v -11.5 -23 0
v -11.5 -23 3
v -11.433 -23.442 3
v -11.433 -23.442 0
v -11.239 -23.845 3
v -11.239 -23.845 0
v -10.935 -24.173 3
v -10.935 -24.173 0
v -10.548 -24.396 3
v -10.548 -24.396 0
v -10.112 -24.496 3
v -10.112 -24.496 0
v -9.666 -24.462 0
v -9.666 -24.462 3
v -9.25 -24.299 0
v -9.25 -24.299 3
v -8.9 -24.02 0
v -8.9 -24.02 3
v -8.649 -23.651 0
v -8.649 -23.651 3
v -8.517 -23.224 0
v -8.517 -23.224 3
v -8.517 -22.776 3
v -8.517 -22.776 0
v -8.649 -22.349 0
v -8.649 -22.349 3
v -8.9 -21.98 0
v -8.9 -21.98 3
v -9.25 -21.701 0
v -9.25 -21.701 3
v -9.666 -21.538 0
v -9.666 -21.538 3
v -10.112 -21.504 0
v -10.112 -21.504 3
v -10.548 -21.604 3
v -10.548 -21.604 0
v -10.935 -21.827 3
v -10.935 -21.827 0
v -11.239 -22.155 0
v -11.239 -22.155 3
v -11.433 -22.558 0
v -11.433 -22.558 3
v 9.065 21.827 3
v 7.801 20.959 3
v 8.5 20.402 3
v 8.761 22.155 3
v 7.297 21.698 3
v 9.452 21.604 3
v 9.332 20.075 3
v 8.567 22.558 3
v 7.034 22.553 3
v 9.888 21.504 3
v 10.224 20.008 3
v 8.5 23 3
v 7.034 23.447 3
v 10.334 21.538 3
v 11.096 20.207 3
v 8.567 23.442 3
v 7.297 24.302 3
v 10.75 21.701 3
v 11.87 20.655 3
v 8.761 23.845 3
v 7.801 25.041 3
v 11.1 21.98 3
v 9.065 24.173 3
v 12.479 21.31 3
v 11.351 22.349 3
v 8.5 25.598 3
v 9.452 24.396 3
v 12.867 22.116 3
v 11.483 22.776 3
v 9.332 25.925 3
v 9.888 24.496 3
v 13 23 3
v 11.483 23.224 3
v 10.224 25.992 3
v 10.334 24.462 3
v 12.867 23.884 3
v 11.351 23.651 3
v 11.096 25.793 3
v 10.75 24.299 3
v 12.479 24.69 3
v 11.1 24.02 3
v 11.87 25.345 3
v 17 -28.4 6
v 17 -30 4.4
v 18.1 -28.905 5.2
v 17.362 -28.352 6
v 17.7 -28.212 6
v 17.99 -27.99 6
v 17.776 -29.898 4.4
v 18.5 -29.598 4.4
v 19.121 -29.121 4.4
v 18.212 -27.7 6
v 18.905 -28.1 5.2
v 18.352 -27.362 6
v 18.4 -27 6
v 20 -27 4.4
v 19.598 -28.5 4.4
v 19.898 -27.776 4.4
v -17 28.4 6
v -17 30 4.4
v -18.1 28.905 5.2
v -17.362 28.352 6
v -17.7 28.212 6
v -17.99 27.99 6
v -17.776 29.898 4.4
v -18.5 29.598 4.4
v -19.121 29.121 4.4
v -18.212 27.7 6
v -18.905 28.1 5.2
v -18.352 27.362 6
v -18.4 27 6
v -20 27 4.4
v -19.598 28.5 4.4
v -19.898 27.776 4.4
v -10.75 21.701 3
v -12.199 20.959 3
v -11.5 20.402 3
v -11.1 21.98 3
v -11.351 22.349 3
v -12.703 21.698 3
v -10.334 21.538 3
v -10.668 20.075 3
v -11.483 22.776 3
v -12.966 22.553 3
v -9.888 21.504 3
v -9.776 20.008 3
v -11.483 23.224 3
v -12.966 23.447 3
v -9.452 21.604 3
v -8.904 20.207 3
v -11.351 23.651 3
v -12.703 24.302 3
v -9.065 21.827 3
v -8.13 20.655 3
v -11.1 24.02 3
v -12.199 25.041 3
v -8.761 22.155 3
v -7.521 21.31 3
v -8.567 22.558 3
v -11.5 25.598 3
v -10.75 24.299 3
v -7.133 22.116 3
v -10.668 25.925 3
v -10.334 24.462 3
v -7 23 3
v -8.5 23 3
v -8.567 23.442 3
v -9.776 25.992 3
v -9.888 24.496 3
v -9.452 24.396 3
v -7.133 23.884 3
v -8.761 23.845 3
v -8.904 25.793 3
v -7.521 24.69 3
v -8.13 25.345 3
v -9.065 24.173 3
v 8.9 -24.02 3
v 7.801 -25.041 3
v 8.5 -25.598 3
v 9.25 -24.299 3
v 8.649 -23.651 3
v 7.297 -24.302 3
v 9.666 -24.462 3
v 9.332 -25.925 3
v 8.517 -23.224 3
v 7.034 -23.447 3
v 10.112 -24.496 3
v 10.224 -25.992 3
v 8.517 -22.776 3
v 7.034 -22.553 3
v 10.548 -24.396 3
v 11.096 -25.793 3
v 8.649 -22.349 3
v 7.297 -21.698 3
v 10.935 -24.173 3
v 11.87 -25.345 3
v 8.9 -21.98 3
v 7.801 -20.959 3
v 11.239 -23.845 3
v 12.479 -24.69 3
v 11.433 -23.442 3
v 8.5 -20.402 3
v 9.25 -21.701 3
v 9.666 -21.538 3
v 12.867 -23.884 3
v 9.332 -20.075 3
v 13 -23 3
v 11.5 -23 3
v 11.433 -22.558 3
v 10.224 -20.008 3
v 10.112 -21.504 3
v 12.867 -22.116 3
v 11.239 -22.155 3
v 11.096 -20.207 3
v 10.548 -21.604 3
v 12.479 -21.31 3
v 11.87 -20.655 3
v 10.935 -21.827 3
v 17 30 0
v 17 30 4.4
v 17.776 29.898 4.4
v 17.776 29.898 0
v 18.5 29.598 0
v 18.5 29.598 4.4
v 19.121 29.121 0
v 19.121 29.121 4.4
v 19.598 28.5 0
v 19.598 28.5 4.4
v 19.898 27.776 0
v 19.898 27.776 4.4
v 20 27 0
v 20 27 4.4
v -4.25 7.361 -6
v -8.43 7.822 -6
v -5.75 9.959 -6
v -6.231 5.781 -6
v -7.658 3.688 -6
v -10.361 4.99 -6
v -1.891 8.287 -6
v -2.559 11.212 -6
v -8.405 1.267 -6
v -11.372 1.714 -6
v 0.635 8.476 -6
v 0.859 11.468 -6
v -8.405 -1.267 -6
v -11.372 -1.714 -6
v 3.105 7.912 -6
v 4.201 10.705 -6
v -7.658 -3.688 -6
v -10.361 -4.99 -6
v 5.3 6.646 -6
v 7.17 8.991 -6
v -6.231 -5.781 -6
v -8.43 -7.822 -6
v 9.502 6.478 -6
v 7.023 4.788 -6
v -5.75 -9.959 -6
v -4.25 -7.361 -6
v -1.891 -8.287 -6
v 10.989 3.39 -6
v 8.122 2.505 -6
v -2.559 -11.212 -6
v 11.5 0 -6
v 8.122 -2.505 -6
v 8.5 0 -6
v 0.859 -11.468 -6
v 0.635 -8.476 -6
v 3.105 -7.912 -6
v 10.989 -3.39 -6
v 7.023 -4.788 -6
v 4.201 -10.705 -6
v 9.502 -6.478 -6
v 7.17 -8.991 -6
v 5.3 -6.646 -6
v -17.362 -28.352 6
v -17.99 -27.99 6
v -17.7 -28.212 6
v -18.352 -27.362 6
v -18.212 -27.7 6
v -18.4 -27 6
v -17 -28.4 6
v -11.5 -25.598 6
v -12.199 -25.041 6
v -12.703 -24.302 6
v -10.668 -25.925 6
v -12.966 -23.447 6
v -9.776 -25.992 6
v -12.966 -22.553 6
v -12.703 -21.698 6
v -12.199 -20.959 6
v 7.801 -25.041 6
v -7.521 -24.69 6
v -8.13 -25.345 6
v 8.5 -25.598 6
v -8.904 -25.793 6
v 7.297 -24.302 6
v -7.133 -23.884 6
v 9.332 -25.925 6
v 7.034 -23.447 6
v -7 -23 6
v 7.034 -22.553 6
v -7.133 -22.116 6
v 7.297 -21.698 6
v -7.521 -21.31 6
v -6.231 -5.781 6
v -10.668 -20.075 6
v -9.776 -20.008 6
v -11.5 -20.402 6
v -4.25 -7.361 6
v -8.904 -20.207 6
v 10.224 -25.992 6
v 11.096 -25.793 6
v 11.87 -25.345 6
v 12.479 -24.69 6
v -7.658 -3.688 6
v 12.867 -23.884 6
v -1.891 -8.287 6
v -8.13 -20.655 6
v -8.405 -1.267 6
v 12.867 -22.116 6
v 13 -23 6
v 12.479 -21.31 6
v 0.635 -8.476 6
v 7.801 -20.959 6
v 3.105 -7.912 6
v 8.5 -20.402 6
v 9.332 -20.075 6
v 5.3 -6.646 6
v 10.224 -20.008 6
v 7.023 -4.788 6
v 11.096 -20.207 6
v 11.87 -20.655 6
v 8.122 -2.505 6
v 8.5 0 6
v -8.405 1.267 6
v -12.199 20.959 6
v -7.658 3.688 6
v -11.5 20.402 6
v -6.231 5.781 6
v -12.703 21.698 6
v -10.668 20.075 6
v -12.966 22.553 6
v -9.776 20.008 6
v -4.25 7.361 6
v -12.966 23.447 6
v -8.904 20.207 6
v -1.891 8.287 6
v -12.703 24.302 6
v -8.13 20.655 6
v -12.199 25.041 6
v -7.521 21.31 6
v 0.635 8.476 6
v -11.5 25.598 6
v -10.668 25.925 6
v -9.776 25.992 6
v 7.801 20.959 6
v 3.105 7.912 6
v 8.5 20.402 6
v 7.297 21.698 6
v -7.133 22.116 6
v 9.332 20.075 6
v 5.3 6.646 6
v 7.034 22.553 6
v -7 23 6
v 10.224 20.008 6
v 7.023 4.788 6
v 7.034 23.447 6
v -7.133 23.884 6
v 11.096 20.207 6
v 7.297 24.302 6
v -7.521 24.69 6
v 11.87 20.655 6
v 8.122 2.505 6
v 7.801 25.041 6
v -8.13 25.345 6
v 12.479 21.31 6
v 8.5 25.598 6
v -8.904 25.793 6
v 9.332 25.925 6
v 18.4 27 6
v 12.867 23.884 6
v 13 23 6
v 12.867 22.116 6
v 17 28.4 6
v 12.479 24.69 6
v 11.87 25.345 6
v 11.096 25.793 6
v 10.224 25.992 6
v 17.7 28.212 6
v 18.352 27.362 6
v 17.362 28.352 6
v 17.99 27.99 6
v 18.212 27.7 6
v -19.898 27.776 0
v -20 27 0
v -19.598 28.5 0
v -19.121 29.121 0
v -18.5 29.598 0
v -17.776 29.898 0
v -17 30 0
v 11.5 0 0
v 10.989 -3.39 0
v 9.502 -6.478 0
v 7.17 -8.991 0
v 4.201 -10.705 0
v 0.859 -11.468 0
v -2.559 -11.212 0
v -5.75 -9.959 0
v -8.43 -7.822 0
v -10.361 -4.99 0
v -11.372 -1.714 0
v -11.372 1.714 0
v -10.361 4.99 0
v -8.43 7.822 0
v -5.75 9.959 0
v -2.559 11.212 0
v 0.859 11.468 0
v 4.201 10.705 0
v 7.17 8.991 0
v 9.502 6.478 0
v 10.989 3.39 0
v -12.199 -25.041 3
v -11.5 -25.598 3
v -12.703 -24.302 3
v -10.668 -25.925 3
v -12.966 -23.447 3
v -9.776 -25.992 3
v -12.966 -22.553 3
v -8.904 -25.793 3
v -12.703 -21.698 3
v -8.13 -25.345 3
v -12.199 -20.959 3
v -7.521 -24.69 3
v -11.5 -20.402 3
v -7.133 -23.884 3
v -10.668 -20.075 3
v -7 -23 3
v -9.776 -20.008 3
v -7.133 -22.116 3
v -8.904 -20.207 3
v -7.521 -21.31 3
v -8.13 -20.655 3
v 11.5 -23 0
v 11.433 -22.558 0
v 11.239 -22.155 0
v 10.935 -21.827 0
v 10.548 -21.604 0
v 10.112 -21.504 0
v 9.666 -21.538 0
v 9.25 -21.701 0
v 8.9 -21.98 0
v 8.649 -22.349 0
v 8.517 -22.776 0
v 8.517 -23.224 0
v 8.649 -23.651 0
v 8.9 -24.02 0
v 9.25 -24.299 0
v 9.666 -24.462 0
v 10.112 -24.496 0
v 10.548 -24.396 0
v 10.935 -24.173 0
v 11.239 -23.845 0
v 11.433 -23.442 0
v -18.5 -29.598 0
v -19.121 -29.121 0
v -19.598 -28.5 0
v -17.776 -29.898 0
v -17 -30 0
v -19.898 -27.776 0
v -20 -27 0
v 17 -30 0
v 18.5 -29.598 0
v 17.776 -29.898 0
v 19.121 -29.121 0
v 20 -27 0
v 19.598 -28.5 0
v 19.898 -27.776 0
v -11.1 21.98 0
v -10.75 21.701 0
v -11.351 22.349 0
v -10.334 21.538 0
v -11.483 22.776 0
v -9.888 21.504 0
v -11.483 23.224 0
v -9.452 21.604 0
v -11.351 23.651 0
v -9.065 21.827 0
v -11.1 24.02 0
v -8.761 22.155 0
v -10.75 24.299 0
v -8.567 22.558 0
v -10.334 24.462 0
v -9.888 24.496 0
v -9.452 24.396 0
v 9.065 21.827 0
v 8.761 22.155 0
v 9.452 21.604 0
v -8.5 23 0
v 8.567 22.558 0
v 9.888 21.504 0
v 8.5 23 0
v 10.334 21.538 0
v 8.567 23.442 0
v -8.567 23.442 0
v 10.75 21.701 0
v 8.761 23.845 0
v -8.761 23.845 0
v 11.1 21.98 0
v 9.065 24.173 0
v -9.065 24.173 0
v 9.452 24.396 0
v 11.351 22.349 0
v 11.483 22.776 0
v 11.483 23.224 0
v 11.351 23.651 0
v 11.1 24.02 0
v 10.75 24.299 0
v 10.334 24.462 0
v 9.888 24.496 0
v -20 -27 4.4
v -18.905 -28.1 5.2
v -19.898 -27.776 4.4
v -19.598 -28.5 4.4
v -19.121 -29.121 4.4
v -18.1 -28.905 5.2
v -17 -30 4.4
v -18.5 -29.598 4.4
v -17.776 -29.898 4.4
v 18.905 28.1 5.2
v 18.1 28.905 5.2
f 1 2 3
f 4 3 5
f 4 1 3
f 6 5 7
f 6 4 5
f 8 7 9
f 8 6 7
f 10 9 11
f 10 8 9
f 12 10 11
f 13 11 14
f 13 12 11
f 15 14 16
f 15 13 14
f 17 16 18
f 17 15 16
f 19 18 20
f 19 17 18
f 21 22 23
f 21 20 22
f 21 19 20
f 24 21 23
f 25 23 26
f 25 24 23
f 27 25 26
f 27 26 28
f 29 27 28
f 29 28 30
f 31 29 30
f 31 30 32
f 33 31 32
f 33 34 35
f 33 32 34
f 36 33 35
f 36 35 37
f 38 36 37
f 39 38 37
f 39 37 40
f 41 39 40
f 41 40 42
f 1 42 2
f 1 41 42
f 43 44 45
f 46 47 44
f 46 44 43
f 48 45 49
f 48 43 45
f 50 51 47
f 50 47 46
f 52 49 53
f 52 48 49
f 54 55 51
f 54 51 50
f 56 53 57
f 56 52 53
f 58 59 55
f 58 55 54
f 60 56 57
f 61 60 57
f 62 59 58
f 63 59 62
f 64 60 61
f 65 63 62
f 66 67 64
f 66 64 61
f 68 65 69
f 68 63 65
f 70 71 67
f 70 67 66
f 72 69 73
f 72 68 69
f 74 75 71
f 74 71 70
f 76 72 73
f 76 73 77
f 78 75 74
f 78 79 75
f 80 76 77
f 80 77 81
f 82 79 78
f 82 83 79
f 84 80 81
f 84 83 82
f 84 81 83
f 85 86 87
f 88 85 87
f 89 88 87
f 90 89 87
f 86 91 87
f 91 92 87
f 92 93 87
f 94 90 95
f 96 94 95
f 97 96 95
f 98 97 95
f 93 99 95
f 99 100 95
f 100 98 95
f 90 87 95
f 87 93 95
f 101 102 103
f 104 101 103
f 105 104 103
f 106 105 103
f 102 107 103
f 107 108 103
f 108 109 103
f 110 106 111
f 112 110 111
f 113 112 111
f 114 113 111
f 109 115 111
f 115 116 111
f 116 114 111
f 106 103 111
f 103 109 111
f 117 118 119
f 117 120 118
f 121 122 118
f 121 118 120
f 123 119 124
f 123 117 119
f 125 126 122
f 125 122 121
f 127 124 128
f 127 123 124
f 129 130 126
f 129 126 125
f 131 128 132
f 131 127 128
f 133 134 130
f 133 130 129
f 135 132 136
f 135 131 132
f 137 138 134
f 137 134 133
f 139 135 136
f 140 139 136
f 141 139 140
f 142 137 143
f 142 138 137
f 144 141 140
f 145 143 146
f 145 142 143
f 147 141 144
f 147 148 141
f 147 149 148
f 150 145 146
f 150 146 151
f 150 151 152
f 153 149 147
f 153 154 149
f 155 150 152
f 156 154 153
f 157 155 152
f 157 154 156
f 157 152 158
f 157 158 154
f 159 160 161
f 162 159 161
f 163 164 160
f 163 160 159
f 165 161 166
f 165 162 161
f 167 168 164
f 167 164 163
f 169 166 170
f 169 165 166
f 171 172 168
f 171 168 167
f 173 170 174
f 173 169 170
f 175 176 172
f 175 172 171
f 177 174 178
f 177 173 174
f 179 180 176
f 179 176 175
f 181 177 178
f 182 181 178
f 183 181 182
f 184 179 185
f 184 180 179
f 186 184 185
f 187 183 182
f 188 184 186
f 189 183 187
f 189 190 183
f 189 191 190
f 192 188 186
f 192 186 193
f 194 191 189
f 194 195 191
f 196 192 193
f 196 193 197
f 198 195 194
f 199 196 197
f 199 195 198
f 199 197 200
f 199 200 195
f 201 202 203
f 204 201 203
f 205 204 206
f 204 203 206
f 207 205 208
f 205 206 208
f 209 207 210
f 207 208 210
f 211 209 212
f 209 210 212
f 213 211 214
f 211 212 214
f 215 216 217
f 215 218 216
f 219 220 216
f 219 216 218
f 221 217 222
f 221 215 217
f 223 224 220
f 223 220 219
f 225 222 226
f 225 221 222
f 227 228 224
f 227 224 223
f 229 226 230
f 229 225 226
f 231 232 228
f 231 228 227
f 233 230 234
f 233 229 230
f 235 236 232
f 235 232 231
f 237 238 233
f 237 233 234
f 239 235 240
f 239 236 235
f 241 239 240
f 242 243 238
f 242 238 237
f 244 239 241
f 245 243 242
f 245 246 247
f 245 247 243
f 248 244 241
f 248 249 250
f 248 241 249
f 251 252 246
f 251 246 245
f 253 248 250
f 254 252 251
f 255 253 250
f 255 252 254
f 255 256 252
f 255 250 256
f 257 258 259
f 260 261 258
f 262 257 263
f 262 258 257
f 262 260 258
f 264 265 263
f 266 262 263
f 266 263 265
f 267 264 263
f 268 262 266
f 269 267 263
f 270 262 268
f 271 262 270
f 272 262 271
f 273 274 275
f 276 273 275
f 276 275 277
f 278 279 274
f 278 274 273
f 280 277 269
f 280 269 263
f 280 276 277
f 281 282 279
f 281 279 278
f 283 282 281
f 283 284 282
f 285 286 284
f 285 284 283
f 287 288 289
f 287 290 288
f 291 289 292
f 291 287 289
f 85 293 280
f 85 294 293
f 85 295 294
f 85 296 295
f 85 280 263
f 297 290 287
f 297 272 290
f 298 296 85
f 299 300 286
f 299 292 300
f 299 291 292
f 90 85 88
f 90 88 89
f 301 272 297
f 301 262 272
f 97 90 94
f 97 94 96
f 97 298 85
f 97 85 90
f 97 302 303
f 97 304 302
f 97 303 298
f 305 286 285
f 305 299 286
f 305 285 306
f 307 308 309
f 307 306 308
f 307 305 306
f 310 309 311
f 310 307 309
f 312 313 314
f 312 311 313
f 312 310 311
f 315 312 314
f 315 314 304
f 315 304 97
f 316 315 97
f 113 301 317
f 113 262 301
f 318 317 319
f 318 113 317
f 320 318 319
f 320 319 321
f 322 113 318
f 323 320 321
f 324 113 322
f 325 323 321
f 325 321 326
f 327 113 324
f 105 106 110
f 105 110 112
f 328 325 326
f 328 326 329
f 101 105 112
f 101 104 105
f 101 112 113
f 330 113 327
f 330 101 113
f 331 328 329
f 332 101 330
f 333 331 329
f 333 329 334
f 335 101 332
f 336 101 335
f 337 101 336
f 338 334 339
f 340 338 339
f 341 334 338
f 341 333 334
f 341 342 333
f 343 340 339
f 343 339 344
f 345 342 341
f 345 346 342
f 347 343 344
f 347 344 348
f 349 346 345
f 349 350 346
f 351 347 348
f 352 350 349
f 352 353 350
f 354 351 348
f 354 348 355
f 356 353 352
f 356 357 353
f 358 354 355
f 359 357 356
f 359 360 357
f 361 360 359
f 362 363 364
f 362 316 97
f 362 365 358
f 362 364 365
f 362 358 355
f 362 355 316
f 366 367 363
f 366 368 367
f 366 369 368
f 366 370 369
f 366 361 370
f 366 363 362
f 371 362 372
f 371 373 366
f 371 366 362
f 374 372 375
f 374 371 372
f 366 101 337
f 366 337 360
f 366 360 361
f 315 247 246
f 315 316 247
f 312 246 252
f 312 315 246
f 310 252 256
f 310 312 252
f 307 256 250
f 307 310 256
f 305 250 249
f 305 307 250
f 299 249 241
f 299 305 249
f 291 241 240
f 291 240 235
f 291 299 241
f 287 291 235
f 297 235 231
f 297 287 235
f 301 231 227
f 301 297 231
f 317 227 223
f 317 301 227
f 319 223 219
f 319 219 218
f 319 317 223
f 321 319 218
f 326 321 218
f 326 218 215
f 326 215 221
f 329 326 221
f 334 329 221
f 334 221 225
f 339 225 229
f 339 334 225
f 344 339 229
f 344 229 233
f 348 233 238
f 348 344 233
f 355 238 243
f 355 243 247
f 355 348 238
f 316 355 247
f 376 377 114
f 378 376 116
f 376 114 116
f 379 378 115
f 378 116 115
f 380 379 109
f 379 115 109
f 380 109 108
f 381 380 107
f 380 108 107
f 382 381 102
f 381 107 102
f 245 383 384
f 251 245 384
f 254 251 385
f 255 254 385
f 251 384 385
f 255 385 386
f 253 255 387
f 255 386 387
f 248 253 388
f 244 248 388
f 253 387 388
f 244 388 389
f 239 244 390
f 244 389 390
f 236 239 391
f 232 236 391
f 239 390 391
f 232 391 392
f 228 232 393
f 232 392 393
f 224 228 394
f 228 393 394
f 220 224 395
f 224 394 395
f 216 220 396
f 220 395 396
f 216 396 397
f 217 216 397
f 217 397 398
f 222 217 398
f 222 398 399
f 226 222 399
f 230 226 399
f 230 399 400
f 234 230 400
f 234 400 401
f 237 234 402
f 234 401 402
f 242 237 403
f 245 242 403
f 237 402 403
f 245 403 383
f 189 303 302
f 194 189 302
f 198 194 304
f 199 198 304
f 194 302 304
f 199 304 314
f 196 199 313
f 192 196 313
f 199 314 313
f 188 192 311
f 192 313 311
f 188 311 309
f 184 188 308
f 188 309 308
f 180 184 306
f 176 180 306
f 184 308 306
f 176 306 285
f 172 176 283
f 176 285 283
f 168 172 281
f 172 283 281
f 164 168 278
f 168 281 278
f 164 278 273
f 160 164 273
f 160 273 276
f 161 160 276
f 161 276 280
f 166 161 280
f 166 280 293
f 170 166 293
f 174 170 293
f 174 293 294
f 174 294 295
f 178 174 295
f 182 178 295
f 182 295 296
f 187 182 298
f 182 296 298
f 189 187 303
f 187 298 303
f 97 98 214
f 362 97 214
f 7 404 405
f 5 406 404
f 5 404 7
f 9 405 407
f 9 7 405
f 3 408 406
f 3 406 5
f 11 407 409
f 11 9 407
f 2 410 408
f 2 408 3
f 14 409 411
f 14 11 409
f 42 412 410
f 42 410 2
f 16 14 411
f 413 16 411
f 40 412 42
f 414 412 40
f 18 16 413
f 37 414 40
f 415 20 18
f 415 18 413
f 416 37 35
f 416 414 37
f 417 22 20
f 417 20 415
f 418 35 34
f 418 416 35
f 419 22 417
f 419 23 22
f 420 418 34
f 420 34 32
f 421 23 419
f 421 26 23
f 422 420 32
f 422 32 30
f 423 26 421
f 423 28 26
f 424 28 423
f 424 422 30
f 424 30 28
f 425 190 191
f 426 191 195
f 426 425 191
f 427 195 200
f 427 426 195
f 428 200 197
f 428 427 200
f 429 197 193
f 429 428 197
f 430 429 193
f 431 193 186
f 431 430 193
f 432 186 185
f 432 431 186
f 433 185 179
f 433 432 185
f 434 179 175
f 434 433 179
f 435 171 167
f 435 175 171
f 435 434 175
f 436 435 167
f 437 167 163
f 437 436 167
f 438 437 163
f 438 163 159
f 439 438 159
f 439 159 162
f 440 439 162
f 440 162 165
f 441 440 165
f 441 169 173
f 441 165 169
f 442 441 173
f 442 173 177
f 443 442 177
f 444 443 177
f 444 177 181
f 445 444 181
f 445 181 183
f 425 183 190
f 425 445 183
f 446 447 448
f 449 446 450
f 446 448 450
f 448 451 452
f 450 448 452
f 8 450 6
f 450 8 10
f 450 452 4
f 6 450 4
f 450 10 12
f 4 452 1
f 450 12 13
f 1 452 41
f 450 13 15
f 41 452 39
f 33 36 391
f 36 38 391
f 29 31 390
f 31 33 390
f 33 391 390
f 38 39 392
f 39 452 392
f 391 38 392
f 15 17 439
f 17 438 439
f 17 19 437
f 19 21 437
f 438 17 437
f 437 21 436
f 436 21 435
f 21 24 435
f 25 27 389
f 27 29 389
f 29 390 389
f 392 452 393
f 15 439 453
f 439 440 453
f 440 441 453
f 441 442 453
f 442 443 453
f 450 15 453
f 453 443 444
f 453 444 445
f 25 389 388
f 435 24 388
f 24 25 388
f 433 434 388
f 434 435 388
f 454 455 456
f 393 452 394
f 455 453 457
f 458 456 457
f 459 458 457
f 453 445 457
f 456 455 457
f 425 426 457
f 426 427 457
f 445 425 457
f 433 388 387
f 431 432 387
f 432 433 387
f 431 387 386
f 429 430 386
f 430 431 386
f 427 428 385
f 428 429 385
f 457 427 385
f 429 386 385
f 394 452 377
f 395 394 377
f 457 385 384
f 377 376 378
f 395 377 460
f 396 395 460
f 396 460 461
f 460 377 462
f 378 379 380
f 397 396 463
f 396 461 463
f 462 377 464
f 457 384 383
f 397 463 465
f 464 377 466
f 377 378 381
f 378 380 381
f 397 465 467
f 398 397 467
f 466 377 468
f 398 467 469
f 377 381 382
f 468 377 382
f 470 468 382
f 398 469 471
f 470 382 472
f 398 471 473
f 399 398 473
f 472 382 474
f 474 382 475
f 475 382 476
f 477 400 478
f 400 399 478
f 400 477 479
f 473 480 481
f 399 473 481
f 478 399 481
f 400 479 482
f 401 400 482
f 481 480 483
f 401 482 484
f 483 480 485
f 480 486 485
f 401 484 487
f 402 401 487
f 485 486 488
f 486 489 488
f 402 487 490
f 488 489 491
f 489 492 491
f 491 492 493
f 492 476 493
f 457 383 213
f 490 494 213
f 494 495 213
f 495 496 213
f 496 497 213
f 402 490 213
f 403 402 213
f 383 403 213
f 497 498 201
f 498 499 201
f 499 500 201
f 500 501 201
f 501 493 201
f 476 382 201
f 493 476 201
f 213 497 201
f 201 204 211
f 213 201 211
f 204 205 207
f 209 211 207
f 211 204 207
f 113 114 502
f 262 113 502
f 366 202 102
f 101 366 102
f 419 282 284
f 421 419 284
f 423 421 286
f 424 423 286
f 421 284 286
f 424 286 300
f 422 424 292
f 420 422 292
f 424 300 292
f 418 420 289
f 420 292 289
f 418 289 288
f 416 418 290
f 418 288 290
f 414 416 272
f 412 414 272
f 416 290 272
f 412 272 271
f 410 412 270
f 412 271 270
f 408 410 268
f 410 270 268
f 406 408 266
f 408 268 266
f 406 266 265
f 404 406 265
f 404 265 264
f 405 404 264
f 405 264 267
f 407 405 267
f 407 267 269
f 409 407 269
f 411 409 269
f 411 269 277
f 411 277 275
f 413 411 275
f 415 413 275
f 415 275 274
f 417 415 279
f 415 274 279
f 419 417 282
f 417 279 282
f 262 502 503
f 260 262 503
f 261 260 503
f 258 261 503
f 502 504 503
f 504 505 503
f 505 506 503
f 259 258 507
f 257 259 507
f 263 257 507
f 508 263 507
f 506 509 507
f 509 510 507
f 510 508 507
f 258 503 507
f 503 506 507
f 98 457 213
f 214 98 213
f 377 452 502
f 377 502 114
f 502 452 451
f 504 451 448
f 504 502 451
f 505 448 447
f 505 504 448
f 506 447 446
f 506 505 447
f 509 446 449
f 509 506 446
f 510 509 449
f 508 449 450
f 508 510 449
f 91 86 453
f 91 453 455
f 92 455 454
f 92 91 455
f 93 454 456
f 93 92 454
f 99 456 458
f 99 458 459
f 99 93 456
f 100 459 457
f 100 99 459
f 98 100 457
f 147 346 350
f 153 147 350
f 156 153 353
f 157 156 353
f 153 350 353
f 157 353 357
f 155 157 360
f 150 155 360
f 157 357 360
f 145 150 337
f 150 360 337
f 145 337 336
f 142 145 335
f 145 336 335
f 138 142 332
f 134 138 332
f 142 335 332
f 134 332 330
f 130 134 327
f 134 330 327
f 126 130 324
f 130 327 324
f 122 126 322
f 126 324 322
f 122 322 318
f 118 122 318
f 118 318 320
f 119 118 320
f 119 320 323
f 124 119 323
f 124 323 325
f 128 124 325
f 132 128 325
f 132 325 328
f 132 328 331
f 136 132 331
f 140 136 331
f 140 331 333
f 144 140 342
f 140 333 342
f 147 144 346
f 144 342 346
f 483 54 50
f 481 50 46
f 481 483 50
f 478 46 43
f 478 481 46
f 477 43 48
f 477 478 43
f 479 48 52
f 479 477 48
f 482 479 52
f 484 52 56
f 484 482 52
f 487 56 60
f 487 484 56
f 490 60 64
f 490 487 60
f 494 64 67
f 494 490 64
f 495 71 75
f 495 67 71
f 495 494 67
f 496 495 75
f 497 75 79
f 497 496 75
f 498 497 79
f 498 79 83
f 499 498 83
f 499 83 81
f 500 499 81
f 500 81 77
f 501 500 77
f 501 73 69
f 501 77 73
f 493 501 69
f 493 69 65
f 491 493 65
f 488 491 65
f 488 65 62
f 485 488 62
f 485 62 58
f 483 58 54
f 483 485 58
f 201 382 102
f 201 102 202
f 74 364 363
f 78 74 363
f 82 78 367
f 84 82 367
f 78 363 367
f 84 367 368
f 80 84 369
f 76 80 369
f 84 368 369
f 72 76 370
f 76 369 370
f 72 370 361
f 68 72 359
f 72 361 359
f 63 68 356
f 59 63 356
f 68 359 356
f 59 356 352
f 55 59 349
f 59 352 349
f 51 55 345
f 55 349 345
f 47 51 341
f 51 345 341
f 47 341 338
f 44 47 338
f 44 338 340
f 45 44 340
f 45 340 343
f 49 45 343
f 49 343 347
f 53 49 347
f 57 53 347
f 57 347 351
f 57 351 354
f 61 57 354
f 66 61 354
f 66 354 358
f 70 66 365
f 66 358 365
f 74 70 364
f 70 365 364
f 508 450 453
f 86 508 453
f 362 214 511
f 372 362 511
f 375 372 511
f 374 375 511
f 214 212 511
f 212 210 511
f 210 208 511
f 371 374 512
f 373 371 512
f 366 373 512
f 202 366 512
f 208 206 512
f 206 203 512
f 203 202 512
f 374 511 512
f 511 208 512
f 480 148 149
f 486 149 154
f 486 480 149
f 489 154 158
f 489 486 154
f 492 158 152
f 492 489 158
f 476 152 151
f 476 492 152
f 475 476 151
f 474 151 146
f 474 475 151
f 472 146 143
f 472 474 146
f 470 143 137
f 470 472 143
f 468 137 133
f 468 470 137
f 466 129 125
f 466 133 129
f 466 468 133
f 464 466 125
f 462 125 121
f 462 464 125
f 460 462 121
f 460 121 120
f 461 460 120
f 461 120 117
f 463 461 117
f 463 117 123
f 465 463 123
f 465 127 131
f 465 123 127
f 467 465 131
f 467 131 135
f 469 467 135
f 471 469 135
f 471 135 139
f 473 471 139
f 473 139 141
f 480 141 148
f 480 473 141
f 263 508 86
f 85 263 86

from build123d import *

# Parameters (mm, degrees)
SKETCH_1_W          = 40
SKETCH_1_H          = 60
SKETCH_1_R          = 1.5
EXTRUDE_1_DEPTH     = 6
SKETCH_2_R          = 3
CUT_EXTRUDE_1_DEPTH = 3
FILLET_1_R          = 3
CHAMFER_1_SIZE      = 1.6
SKETCH_3_R          = 8.5
CUT_EXTRUDE_2_DEPTH = 37.551333765
SKETCH_4_R          = 11.5
SKETCH_4_R_2        = 8.5
EXTRUDE_2_DEPTH     = 6


with BuildPart() as part:
    # 草圖1 → 填料-伸長1 (new body)
    with BuildSketch(Plane.XY):
        Rectangle(SKETCH_1_W, SKETCH_1_H)
        with Locations((-10, 23)):
            Circle(SKETCH_1_R, mode=Mode.SUBTRACT)
        with Locations(Location((10, 23, 0), (0, 0, 180))):
            Circle(SKETCH_1_R, mode=Mode.SUBTRACT)
        with Locations((10, -23)):
            Circle(SKETCH_1_R, mode=Mode.SUBTRACT)
        with Locations(Location((-10, -23, 0), (0, 0, 180))):
            Circle(SKETCH_1_R, mode=Mode.SUBTRACT)
    extrude(amount=EXTRUDE_1_DEPTH)

    # 草圖2 → 除料-伸長1 (cut)
    with BuildSketch(Plane.XY.offset(6)):
        with Locations((-10, 23)):
            Circle(SKETCH_2_R)
        with Locations((10, 23)):
            Circle(SKETCH_2_R)
        with Locations((10, -23)):
            Circle(SKETCH_2_R)
        with Locations((-10, -23)):
            Circle(SKETCH_2_R)
    extrude(amount=-CUT_EXTRUDE_1_DEPTH, mode=Mode.SUBTRACT)

    # 圓角1
    fillet_1_edges = [part.edges().sort_by_distance(p)[0] for p in [
        (-20, 30, 3),
        (20, 30, 3),
        (20, -30, 3),
        (-20, -30, 3),
    ]]
    fillet(fillet_1_edges, radius=FILLET_1_R)

    # 導角1
    chamfer_1_edges = [part.edges().sort_by_distance(p)[0] for p in [
        (0, -30, 6),
        (-20, 0, 6),
        (20, 0, 6),
        (0, 30, 6),
        (19.121320344, 29.121320344, 6),
        (-19.121320344, 29.121320344, 6),
        (19.121320344, -29.121320344, 6),
        (-19.121320344, -29.121320344, 6),
    ]]
    chamfer(chamfer_1_edges, length=CHAMFER_1_SIZE)

    # 草圖3 → 除料-伸長2 (cut, through all)
    with BuildSketch(Plane.XY.offset(6)):
        Circle(SKETCH_3_R)
    extrude(amount=-CUT_EXTRUDE_2_DEPTH, mode=Mode.SUBTRACT)

    # 草圖4 → 填料-伸長2 (add)
    with BuildSketch(Plane(origin=(0, 0, 0), x_dir=(-1, 0, 0), z_dir=(0, 0, -1))):
        with Locations(Location((0, 0, 0), (0, 0, 180))):
            Circle(SKETCH_4_R)
        with Locations(Location((0, 0, 0), (0, 0, 180))):
            Circle(SKETCH_4_R_2, mode=Mode.SUBTRACT)
    extrude(amount=EXTRUDE_2_DEPTH)


solid = part.part
